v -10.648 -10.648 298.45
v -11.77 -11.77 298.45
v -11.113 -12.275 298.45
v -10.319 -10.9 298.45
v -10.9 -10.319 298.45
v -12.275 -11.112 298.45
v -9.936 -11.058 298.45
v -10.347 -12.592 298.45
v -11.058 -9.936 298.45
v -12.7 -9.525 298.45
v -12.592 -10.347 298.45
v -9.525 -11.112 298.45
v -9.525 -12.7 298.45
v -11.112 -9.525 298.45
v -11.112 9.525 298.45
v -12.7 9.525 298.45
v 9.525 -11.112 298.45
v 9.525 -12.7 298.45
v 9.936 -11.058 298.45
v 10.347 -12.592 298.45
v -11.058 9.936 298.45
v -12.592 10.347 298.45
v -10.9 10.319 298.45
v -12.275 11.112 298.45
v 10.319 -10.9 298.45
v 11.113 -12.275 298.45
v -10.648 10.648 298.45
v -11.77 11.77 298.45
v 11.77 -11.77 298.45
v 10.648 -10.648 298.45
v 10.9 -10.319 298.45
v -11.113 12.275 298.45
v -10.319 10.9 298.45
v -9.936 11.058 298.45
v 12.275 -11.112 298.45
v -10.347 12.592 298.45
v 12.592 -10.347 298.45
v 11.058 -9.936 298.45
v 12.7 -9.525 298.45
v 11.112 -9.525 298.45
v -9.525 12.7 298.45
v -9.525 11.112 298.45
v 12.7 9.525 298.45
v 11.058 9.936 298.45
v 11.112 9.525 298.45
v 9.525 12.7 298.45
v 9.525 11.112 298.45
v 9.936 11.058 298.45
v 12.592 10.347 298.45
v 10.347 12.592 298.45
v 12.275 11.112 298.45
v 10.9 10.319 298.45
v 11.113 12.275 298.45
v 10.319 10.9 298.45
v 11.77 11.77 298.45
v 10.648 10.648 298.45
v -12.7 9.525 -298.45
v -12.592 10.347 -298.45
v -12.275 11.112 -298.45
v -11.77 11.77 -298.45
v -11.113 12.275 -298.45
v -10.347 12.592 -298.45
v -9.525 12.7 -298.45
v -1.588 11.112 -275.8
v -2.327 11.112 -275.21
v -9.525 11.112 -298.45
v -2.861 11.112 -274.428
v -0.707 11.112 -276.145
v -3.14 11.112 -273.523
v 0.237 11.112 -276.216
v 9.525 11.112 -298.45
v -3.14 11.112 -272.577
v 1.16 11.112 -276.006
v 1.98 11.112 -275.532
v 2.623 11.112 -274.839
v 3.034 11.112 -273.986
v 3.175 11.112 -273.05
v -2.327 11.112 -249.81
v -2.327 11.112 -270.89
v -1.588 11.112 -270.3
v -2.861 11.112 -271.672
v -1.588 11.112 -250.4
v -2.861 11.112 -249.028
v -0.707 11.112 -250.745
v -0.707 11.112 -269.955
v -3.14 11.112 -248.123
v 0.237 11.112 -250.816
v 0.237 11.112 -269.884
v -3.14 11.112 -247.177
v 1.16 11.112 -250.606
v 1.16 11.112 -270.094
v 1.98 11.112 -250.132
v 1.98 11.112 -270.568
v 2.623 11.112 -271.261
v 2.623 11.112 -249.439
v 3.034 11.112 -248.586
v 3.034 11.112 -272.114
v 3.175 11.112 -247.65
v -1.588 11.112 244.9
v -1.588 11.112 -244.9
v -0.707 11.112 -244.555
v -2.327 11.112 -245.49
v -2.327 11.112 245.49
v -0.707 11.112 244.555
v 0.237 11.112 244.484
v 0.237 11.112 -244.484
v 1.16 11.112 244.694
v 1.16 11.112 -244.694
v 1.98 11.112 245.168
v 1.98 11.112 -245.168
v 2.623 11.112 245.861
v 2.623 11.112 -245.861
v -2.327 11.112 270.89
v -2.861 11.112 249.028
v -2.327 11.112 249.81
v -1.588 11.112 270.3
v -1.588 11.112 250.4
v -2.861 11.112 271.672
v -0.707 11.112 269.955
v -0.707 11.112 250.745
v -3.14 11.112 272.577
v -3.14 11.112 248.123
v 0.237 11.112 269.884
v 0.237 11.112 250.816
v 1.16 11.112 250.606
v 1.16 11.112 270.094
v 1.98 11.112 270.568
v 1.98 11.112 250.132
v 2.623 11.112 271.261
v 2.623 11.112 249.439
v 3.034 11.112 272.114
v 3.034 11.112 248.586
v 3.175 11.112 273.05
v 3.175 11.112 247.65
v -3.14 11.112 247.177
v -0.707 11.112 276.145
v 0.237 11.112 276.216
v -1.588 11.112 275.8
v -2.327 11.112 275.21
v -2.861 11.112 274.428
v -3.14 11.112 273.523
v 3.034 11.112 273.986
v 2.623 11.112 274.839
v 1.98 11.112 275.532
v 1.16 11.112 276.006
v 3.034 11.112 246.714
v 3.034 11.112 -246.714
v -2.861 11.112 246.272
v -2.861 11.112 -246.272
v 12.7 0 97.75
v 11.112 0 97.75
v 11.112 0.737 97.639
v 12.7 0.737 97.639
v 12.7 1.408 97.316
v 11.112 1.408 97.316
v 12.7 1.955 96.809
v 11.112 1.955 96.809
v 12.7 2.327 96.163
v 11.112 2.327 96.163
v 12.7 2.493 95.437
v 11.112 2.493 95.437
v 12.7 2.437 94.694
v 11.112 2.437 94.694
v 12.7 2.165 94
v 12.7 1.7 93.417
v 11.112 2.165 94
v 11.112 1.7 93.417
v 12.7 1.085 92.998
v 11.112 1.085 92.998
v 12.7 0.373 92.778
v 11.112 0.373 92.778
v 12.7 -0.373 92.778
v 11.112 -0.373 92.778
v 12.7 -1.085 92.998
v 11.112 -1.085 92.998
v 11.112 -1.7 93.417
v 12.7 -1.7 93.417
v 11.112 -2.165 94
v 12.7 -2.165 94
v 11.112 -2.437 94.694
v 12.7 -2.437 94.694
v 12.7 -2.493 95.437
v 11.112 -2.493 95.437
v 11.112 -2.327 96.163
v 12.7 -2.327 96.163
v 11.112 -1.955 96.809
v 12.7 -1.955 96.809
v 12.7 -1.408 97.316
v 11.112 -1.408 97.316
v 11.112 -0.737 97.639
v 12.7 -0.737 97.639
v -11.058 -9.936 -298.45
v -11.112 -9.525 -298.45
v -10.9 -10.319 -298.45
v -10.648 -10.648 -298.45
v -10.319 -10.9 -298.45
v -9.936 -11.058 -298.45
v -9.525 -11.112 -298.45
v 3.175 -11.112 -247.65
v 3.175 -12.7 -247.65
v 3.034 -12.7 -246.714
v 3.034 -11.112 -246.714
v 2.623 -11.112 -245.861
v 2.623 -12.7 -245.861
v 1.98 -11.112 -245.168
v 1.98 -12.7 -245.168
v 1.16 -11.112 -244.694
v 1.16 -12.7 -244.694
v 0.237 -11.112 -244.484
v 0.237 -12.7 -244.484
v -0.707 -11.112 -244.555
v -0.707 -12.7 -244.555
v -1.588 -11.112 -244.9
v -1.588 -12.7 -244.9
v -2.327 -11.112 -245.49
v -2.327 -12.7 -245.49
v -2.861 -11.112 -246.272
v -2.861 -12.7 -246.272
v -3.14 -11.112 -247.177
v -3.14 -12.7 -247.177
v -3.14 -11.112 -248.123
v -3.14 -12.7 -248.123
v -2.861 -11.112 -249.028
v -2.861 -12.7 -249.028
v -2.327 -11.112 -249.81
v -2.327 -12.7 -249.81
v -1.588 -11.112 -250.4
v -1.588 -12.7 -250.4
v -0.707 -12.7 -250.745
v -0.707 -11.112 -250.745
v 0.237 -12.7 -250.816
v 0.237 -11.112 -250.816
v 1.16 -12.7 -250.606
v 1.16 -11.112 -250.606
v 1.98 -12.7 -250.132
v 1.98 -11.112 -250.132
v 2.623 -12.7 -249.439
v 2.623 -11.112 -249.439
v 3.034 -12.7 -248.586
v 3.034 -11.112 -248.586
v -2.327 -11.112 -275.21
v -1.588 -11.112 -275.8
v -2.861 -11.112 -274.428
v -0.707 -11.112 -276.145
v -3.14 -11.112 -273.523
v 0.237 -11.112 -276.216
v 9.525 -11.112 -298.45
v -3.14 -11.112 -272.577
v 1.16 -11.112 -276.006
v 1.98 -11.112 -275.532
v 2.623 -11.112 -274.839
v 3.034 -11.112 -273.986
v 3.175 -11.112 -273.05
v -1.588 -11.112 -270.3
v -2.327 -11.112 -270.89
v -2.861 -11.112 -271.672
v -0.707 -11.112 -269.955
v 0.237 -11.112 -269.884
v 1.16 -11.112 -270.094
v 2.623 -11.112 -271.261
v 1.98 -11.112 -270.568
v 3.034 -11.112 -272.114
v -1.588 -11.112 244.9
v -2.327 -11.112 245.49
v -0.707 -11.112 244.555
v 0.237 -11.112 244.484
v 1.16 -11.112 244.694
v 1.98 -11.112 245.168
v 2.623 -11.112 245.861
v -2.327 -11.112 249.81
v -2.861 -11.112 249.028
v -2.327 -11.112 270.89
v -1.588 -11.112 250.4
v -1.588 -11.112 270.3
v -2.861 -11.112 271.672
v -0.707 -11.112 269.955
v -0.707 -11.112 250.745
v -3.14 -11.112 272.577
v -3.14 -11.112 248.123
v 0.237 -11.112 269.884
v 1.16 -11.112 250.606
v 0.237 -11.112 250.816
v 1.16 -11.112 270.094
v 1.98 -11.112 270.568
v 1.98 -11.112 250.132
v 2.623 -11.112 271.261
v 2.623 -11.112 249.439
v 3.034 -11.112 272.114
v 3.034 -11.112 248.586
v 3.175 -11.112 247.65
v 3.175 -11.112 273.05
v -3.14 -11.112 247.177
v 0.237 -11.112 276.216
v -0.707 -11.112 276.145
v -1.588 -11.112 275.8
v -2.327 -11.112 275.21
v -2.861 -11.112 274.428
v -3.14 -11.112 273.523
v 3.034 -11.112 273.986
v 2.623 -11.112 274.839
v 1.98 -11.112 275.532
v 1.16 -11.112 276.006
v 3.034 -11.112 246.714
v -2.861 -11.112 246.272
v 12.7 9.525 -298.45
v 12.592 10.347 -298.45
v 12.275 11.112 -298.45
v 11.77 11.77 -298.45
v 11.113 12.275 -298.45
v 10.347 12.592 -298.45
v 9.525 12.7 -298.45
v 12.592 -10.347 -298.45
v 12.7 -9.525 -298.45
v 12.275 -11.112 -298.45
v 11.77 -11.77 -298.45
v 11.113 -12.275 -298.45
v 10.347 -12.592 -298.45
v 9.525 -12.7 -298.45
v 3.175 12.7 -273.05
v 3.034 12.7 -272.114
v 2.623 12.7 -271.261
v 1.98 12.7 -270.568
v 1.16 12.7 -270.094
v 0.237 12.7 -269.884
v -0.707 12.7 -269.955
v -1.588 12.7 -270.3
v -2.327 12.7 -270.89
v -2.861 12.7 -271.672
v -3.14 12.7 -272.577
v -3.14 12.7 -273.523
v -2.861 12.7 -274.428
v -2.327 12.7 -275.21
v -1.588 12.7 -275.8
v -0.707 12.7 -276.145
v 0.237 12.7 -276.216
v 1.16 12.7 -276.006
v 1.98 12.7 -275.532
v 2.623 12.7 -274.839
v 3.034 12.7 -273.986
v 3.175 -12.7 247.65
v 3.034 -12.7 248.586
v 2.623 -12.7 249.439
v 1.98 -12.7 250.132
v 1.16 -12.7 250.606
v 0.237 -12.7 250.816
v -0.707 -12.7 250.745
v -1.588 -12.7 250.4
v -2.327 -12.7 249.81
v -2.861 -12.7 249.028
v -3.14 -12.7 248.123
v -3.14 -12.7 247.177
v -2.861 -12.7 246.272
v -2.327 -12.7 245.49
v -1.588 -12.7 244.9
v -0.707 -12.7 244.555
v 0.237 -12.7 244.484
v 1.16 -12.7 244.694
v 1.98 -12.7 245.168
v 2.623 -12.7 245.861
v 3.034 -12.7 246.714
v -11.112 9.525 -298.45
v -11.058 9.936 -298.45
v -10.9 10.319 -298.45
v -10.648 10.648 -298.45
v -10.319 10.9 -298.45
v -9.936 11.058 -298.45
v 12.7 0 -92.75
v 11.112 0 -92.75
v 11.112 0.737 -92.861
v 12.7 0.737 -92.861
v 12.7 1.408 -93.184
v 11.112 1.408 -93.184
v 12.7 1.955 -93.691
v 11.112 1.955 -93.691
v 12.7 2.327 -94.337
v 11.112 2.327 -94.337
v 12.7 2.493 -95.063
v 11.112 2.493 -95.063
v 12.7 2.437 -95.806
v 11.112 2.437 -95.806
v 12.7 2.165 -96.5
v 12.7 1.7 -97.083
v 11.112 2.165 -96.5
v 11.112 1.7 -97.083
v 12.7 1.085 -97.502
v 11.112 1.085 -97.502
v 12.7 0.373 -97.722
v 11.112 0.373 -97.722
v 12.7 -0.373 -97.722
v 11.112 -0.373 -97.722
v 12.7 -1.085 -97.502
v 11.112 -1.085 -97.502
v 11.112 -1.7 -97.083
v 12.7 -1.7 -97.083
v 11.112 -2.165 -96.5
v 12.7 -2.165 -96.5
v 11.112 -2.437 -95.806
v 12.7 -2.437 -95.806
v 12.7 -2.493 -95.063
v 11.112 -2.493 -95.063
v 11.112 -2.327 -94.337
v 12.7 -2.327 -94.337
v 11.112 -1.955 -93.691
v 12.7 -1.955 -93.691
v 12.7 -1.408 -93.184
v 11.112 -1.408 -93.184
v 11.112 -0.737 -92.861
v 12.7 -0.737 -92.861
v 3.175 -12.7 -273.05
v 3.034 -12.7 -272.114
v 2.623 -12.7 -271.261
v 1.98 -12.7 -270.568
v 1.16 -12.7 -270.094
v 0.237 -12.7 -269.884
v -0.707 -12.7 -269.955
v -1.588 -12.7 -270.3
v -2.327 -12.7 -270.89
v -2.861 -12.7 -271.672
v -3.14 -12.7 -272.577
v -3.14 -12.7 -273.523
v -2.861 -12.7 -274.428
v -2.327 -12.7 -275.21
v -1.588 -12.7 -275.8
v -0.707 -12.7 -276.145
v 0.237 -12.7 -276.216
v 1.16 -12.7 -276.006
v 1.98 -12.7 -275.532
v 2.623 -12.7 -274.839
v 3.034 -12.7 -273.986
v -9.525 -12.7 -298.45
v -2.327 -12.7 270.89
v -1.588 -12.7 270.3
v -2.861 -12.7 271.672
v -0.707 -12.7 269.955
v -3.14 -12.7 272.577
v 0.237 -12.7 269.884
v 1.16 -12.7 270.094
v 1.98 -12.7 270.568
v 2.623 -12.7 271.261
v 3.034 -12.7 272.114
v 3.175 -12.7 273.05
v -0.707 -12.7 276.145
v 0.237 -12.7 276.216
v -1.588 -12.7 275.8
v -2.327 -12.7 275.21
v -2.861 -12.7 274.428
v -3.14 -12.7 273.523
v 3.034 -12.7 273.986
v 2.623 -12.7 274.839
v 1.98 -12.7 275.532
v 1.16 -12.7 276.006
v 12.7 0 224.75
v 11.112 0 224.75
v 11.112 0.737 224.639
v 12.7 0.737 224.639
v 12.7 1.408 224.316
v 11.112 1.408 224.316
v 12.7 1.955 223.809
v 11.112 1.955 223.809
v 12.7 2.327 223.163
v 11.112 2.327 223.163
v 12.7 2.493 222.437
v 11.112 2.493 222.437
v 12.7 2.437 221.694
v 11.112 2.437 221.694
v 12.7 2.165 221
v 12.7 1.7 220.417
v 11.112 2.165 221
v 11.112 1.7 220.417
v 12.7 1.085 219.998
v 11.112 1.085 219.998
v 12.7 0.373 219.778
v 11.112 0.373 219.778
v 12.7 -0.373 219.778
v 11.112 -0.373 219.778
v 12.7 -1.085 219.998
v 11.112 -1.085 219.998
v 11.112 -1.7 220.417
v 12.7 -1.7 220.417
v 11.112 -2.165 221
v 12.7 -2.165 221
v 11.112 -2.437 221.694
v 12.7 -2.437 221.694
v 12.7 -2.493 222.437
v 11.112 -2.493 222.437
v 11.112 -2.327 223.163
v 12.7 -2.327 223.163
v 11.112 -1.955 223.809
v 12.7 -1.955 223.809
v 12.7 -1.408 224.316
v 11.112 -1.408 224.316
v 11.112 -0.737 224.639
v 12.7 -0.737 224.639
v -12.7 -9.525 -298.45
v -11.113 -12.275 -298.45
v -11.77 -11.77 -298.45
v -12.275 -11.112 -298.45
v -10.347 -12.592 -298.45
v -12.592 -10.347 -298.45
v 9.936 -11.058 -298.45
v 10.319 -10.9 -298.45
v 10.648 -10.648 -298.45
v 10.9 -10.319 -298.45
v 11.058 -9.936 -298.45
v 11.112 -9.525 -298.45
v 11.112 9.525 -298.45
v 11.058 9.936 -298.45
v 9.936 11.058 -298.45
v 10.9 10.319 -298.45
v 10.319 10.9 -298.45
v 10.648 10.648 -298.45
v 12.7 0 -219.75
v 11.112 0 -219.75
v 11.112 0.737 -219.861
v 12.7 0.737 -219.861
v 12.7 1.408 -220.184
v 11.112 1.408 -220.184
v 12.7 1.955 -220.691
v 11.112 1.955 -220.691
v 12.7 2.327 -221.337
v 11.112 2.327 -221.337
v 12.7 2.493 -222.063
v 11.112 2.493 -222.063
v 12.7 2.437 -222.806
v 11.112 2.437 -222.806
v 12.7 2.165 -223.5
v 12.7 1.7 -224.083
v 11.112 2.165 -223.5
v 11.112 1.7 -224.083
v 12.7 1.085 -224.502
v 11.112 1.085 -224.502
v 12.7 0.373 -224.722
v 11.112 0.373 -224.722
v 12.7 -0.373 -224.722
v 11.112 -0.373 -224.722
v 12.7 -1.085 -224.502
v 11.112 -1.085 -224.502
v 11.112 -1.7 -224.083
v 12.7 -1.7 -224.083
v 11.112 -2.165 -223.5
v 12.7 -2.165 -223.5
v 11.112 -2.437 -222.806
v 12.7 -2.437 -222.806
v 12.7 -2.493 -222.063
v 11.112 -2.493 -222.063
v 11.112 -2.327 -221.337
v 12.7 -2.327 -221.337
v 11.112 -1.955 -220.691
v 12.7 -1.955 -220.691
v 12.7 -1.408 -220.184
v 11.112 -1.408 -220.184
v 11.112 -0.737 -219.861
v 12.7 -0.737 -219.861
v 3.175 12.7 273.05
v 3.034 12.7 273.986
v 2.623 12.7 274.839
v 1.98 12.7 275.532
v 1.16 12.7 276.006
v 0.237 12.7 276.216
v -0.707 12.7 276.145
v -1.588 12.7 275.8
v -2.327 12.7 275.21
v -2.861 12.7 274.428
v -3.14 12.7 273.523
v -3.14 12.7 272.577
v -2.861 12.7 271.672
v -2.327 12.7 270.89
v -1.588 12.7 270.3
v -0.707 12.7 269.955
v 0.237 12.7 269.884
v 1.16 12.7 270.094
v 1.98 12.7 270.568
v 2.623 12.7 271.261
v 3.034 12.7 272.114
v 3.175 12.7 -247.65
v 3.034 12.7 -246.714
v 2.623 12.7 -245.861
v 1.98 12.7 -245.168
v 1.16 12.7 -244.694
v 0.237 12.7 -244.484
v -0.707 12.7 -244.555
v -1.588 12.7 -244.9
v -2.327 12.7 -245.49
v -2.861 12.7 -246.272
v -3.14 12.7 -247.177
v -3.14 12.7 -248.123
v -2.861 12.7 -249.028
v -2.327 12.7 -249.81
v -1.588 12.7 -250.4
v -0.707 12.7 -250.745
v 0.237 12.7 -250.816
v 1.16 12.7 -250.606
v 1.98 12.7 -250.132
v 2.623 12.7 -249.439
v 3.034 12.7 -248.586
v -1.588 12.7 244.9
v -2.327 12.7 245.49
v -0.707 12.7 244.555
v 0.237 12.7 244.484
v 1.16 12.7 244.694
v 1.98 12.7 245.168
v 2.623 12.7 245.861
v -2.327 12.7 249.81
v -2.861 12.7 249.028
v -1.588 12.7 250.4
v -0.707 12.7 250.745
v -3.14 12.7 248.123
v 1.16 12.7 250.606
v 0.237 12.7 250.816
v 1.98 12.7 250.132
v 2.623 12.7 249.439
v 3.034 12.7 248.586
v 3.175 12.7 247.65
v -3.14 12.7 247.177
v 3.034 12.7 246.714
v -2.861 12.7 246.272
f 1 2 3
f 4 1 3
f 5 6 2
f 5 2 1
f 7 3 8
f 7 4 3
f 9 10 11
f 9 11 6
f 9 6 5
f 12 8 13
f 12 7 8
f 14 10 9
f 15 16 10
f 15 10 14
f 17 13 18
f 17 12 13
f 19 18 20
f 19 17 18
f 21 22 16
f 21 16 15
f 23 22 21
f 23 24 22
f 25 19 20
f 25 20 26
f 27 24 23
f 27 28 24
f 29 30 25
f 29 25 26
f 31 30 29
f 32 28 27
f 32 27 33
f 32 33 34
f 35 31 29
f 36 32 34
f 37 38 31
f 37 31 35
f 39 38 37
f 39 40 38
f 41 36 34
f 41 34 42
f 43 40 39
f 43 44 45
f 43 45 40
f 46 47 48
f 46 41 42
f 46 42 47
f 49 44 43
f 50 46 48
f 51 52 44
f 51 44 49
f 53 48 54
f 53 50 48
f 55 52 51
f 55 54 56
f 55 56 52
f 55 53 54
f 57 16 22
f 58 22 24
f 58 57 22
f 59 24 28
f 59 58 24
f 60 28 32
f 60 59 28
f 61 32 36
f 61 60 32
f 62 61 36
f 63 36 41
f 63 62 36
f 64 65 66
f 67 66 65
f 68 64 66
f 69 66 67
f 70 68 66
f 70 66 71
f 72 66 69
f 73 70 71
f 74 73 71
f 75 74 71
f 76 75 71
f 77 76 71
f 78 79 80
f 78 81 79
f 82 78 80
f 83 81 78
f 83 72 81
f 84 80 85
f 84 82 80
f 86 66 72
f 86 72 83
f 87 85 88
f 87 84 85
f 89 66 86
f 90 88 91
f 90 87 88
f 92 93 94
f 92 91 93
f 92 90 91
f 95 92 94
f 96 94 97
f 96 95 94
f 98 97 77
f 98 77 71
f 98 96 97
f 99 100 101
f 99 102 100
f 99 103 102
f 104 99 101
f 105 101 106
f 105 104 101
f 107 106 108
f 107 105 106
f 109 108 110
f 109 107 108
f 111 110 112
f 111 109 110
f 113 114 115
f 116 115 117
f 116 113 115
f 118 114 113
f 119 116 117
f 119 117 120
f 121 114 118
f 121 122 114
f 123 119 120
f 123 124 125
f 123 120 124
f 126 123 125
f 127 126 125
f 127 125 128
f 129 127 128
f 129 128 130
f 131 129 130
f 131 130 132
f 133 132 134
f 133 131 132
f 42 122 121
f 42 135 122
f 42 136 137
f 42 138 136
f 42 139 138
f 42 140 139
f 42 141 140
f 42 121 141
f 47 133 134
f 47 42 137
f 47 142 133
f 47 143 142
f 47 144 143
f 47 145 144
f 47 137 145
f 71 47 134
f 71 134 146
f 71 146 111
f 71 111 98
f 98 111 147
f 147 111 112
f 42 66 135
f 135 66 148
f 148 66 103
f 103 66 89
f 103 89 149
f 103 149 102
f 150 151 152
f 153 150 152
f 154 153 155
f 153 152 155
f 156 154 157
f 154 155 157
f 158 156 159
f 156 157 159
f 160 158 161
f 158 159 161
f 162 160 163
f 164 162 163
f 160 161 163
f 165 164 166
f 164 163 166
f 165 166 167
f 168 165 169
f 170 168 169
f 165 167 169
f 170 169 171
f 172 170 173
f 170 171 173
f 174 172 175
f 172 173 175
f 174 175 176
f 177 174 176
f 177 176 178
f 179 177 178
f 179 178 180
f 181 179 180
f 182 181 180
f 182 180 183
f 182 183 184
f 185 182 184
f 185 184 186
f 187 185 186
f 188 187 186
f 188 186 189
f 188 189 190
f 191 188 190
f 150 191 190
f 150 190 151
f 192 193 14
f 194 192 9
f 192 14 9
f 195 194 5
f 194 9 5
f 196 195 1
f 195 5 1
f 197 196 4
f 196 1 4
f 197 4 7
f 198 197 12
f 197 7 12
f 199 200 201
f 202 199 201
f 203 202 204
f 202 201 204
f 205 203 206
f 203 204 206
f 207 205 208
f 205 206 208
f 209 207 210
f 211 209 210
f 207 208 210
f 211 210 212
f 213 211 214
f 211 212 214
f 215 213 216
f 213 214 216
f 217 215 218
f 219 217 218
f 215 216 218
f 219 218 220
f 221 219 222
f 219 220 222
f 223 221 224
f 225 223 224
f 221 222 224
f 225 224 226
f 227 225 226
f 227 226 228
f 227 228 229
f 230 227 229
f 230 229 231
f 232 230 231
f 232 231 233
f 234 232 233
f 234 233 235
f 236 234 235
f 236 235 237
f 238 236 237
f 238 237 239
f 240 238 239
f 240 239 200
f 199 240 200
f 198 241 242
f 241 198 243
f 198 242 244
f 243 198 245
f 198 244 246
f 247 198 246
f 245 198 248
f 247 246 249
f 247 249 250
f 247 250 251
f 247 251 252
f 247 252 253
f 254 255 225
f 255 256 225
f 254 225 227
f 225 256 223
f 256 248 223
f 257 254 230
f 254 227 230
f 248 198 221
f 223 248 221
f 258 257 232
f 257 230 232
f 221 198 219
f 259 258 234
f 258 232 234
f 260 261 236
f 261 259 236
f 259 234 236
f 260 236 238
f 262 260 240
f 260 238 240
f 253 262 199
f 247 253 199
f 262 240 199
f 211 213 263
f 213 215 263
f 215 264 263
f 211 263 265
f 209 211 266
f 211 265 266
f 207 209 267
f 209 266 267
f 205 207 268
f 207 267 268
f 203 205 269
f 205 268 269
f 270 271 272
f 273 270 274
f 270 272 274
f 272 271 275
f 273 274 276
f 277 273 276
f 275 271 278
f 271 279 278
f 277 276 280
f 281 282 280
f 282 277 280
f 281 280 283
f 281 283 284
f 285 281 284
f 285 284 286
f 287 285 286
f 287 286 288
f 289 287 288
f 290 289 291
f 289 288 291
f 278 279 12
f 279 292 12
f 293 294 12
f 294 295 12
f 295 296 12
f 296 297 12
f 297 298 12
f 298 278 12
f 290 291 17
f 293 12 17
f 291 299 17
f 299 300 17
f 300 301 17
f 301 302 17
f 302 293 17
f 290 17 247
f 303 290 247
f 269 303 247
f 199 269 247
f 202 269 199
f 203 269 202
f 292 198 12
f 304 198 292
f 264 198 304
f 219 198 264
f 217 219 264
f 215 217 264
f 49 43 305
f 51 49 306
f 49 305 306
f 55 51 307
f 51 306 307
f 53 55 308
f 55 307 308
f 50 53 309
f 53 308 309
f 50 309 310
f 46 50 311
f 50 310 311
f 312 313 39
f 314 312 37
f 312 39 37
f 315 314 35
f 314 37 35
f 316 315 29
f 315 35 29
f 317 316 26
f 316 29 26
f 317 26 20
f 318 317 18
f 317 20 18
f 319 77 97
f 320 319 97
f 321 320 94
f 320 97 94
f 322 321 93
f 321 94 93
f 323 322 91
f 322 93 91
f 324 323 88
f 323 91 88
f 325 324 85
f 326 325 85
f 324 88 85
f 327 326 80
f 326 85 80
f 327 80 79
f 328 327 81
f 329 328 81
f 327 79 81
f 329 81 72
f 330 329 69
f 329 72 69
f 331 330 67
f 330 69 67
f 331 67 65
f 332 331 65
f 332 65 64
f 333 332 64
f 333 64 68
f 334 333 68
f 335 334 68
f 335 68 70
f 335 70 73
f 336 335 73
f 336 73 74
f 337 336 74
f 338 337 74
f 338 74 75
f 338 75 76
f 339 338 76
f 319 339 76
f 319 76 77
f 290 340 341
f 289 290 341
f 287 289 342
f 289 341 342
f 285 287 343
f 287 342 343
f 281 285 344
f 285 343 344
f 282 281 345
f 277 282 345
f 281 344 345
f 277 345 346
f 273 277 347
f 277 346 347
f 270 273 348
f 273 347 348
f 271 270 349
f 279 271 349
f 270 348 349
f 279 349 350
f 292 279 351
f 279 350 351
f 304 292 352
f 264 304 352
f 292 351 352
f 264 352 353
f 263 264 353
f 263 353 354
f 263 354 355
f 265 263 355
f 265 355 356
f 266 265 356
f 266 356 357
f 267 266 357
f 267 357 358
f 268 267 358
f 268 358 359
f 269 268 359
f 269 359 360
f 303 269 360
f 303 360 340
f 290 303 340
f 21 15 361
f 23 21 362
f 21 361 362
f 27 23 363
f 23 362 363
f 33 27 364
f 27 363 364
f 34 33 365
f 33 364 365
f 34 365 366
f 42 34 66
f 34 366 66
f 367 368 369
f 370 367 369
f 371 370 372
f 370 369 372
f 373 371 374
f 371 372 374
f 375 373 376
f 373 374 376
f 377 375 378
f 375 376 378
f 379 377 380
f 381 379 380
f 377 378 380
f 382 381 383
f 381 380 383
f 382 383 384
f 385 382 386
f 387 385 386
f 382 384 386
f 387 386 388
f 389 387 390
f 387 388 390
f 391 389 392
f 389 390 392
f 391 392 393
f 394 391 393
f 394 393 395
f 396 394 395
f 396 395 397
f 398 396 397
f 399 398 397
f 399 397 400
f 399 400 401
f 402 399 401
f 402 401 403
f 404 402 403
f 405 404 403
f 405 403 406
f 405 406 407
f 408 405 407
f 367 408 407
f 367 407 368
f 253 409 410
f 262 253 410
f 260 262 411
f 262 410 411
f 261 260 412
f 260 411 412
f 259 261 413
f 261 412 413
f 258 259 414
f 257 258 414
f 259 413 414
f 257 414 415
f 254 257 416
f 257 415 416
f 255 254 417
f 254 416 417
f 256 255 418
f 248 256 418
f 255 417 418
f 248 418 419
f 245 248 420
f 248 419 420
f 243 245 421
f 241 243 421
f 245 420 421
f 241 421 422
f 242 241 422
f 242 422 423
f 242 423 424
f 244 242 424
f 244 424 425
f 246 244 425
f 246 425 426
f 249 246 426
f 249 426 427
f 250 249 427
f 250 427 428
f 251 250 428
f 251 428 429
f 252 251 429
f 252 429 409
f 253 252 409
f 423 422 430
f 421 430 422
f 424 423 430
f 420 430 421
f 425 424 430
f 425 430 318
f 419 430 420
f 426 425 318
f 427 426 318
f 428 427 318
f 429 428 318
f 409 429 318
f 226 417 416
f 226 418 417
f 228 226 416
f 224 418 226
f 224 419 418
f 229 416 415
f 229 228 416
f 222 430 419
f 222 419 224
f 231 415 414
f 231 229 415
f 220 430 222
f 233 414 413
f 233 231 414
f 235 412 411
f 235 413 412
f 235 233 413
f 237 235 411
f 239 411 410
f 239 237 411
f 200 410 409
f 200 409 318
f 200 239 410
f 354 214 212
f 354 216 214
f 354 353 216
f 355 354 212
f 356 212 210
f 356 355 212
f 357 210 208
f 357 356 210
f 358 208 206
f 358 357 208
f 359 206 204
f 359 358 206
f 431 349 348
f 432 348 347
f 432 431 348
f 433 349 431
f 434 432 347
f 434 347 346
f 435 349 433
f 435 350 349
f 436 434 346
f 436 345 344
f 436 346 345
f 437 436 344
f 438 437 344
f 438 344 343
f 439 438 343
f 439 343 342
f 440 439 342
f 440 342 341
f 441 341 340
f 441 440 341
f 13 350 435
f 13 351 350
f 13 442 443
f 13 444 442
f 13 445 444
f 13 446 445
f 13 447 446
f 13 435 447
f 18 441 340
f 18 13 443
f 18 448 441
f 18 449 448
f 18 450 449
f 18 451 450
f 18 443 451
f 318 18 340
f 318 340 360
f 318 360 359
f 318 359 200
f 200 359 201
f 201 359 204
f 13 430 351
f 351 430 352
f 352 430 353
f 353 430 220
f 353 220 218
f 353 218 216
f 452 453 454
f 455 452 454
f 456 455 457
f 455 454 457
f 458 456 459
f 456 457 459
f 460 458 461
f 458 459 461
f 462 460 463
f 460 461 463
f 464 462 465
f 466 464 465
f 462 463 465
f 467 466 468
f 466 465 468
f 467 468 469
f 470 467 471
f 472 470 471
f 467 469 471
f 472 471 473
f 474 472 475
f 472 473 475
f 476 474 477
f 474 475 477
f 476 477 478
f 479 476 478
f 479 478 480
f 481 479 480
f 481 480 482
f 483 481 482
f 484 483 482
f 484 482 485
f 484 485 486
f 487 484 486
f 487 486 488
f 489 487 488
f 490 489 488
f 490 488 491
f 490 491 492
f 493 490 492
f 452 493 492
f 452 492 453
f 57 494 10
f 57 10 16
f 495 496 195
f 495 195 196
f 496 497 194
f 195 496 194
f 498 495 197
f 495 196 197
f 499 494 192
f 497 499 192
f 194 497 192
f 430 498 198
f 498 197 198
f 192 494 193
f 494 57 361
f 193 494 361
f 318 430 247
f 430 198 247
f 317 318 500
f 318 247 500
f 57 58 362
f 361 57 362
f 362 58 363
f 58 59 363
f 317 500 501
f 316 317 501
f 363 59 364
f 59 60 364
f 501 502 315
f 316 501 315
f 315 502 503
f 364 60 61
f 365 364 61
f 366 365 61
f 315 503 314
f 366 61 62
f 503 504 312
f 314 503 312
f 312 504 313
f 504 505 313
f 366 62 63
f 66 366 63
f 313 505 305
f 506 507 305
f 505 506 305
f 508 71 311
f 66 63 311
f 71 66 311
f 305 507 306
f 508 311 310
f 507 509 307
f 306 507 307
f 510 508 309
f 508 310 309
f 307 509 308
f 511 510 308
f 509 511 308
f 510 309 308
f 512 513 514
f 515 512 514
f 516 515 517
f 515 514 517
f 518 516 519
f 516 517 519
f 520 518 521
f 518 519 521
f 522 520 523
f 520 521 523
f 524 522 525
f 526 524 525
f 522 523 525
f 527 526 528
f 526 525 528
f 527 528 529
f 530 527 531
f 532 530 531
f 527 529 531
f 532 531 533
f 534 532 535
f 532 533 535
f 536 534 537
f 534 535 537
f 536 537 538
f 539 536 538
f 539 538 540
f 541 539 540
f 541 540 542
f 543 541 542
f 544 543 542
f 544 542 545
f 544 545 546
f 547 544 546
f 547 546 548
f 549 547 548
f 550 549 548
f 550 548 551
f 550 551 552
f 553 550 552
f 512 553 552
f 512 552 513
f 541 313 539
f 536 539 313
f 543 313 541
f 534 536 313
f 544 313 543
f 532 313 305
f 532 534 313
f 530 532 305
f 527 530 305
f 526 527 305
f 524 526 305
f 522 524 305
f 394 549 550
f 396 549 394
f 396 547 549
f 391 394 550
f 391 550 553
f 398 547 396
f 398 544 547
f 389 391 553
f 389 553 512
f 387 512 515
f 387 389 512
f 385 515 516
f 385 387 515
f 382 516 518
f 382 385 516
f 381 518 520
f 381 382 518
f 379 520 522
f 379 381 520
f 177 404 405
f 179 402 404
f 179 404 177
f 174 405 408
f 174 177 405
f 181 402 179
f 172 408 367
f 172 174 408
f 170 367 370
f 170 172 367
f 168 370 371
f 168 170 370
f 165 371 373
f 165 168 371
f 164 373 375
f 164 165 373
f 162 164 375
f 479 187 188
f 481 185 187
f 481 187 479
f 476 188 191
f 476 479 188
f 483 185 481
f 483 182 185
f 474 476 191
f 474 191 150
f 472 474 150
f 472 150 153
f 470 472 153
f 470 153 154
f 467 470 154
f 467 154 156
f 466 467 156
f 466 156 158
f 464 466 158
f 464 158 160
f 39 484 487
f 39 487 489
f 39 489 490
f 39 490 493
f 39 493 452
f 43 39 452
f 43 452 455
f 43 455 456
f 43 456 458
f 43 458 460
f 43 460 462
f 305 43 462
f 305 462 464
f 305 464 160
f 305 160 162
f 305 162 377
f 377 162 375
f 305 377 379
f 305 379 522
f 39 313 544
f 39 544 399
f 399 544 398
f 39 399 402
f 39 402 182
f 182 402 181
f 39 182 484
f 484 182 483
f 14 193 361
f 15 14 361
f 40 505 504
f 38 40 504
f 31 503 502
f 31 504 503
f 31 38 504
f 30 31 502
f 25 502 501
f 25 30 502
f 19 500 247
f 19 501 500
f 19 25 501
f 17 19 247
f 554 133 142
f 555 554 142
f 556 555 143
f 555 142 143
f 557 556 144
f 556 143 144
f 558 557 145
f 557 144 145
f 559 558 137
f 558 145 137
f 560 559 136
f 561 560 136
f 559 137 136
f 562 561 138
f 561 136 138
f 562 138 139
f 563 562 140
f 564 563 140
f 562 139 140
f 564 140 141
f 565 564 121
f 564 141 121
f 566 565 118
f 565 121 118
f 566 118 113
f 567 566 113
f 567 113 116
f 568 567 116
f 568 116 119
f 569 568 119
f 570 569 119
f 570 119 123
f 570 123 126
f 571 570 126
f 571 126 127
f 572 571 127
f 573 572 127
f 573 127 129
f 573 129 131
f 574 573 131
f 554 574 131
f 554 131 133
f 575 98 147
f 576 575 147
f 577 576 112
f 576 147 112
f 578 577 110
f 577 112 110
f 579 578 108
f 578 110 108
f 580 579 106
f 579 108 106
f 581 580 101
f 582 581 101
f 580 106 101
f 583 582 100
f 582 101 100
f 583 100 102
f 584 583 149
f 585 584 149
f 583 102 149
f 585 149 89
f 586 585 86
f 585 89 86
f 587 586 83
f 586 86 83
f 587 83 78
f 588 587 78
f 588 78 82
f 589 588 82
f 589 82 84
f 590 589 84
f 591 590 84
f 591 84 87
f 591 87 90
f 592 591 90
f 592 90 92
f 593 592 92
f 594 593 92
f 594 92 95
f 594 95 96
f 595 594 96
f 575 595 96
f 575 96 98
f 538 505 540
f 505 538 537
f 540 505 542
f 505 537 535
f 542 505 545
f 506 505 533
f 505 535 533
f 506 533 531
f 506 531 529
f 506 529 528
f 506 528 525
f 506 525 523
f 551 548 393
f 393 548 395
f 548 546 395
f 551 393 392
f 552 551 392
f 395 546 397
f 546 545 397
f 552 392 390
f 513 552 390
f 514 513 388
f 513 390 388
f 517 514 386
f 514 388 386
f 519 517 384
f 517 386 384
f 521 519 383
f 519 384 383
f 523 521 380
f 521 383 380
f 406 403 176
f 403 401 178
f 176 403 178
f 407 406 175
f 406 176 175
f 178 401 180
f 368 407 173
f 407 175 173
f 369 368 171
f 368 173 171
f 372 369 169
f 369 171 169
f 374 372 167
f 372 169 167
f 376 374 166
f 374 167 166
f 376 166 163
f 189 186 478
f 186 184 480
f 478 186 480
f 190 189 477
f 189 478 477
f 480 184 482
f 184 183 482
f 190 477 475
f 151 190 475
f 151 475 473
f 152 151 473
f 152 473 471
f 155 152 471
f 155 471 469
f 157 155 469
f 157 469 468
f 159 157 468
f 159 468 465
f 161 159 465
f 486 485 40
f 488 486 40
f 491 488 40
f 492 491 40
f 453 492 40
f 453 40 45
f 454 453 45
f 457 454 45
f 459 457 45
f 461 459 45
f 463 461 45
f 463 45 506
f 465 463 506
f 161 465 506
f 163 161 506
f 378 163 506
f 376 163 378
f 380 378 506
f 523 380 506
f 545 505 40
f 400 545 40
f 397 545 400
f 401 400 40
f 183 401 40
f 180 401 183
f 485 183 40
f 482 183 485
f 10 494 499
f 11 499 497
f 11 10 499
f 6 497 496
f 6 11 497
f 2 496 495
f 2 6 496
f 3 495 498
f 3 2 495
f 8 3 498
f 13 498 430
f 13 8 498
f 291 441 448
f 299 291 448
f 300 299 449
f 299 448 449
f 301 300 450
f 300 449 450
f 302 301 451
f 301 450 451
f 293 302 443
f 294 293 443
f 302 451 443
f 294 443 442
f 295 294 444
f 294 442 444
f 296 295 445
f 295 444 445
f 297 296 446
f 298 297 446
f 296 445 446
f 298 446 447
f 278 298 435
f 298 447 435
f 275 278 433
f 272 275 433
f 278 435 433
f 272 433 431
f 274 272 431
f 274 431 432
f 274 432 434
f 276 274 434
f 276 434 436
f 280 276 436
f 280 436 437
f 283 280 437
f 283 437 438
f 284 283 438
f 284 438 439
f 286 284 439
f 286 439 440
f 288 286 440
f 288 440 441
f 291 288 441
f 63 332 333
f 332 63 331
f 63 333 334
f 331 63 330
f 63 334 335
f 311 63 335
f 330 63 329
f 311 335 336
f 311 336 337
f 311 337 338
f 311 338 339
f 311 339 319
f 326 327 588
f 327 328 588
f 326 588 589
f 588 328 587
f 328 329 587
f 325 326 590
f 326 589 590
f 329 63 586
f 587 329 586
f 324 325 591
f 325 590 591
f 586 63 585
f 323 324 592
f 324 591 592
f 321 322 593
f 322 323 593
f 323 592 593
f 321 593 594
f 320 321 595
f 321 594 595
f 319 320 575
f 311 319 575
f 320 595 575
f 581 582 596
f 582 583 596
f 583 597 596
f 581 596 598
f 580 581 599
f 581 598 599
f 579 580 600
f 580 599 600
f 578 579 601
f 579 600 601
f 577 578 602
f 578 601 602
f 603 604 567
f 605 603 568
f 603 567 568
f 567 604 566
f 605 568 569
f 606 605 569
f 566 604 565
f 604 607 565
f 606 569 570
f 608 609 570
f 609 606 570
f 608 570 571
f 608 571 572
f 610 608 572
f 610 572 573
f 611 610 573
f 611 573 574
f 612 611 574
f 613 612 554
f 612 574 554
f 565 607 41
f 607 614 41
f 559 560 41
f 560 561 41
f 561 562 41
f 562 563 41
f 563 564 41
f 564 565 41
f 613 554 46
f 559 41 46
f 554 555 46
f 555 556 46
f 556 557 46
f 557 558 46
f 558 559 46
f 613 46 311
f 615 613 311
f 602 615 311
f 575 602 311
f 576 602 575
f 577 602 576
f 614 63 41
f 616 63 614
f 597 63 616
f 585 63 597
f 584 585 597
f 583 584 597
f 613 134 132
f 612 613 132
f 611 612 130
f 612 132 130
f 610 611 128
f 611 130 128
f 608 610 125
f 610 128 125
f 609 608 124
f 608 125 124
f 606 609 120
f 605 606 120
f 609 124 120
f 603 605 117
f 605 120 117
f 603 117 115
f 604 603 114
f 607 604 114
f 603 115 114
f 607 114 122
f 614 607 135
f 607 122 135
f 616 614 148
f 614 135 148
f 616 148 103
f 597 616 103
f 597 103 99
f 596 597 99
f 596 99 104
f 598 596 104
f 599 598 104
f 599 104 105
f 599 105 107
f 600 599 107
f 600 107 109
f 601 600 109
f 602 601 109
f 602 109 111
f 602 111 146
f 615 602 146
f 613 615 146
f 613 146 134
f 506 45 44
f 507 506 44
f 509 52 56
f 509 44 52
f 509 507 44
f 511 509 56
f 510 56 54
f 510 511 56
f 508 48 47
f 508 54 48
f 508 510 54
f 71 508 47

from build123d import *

# Parameters (mm, degrees)
SKETCH1_W          = 25.4
SKETCH1_H          = 25.4
BASE_EXTRUDE_DEPTH = 298.45
FILLET1_R          = 3.175
SHELL1_T           = -1.5875
SKETCH4_R          = 3.175
CUT_EXTRUDE1_DEPTH = 26.4
CUT_EXTRUDE3_REACH = 3.588
SKETCH6_R          = 2.5


with BuildPart() as part:
    # Sketch1 → Base-Extrude (new body, symmetric)
    with BuildSketch(Plane.XY):
        Rectangle(SKETCH1_W, SKETCH1_H)
    extrude(amount=BASE_EXTRUDE_DEPTH, both=True)

    # Fillet1
    fillet1_edges = [part.edges().sort_by_distance(p)[0] for p in [
        (-12.7, 12.7, 0),
        (12.7, 12.7, 0),
        (12.7, -12.7, 0),
        (-12.7, -12.7, 0),
    ]]
    fillet(fillet1_edges, radius=FILLET1_R)

    # Shell1
    shell1_openings = [part.faces().sort_by_distance(p)[0] for p in [
        (0, 0, 298.45),
        (0, 0, -298.45),
    ]]
    offset(amount=SHELL1_T, openings=shell1_openings, kind=Kind.INTERSECTION)

    # Sketch4 → Cut-Extrude1 (cut, through all)
    with BuildSketch(Plane.XZ.offset(12.7)):
        with Locations((0, 273.05)):
            Circle(SKETCH4_R)
        with Locations((0, 247.65)):
            Circle(SKETCH4_R)
        with Locations((0, -247.65)):
            Circle(SKETCH4_R)
        with Locations((0, -273.05)):
            Circle(SKETCH4_R)
    extrude(amount=-CUT_EXTRUDE1_DEPTH, mode=Mode.SUBTRACT)

    # Sketch6 → Cut-Extrude3 (cut, up to next)
    with BuildSketch(Plane.ZY.offset(-11.1125), mode=Mode.PRIVATE) as cut_extrude3_sk1:
        with Locations((-95.25, 0)):
            Circle(SKETCH6_R)
    cut_extrude3_tool1 = extrude(cut_extrude3_sk1.sketch, amount=-CUT_EXTRUDE3_REACH, mode=Mode.PRIVATE) & part.part
    add(cut_extrude3_tool1.solids().sort_by_distance((11.1125, 0, -95.25))[0], mode=Mode.SUBTRACT)
    # Sketch6 → Cut-Extrude3 (cut, up to next)
    with BuildSketch(Plane.ZY.offset(-11.1125), mode=Mode.PRIVATE) as cut_extrude3_sk2:
        with Locations((-222.25, 0)):
            Circle(SKETCH6_R)
    cut_extrude3_tool2 = extrude(cut_extrude3_sk2.sketch, amount=-CUT_EXTRUDE3_REACH, mode=Mode.PRIVATE) & part.part
    add(cut_extrude3_tool2.solids().sort_by_distance((11.1125, 0, -222.25))[0], mode=Mode.SUBTRACT)
    # Sketch6 → Cut-Extrude3 (cut, up to next)
    with BuildSketch(Plane.ZY.offset(-11.1125), mode=Mode.PRIVATE) as cut_extrude3_sk3:
        with Locations((222.25, 0)):
            Circle(SKETCH6_R)
    cut_extrude3_tool3 = extrude(cut_extrude3_sk3.sketch, amount=-CUT_EXTRUDE3_REACH, mode=Mode.PRIVATE) & part.part
    add(cut_extrude3_tool3.solids().sort_by_distance((11.1125, 0, 222.25))[0], mode=Mode.SUBTRACT)
    # Sketch6 → Cut-Extrude3 (cut, up to next)
    with BuildSketch(Plane.ZY.offset(-11.1125), mode=Mode.PRIVATE) as cut_extrude3_sk4:
        with Locations((95.25, 0)):
            Circle(SKETCH6_R)
    cut_extrude3_tool4 = extrude(cut_extrude3_sk4.sketch, amount=-CUT_EXTRUDE3_REACH, mode=Mode.PRIVATE) & part.part
    add(cut_extrude3_tool4.solids().sort_by_distance((11.1125, 0, 95.25))[0], mode=Mode.SUBTRACT)


solid = part.part
